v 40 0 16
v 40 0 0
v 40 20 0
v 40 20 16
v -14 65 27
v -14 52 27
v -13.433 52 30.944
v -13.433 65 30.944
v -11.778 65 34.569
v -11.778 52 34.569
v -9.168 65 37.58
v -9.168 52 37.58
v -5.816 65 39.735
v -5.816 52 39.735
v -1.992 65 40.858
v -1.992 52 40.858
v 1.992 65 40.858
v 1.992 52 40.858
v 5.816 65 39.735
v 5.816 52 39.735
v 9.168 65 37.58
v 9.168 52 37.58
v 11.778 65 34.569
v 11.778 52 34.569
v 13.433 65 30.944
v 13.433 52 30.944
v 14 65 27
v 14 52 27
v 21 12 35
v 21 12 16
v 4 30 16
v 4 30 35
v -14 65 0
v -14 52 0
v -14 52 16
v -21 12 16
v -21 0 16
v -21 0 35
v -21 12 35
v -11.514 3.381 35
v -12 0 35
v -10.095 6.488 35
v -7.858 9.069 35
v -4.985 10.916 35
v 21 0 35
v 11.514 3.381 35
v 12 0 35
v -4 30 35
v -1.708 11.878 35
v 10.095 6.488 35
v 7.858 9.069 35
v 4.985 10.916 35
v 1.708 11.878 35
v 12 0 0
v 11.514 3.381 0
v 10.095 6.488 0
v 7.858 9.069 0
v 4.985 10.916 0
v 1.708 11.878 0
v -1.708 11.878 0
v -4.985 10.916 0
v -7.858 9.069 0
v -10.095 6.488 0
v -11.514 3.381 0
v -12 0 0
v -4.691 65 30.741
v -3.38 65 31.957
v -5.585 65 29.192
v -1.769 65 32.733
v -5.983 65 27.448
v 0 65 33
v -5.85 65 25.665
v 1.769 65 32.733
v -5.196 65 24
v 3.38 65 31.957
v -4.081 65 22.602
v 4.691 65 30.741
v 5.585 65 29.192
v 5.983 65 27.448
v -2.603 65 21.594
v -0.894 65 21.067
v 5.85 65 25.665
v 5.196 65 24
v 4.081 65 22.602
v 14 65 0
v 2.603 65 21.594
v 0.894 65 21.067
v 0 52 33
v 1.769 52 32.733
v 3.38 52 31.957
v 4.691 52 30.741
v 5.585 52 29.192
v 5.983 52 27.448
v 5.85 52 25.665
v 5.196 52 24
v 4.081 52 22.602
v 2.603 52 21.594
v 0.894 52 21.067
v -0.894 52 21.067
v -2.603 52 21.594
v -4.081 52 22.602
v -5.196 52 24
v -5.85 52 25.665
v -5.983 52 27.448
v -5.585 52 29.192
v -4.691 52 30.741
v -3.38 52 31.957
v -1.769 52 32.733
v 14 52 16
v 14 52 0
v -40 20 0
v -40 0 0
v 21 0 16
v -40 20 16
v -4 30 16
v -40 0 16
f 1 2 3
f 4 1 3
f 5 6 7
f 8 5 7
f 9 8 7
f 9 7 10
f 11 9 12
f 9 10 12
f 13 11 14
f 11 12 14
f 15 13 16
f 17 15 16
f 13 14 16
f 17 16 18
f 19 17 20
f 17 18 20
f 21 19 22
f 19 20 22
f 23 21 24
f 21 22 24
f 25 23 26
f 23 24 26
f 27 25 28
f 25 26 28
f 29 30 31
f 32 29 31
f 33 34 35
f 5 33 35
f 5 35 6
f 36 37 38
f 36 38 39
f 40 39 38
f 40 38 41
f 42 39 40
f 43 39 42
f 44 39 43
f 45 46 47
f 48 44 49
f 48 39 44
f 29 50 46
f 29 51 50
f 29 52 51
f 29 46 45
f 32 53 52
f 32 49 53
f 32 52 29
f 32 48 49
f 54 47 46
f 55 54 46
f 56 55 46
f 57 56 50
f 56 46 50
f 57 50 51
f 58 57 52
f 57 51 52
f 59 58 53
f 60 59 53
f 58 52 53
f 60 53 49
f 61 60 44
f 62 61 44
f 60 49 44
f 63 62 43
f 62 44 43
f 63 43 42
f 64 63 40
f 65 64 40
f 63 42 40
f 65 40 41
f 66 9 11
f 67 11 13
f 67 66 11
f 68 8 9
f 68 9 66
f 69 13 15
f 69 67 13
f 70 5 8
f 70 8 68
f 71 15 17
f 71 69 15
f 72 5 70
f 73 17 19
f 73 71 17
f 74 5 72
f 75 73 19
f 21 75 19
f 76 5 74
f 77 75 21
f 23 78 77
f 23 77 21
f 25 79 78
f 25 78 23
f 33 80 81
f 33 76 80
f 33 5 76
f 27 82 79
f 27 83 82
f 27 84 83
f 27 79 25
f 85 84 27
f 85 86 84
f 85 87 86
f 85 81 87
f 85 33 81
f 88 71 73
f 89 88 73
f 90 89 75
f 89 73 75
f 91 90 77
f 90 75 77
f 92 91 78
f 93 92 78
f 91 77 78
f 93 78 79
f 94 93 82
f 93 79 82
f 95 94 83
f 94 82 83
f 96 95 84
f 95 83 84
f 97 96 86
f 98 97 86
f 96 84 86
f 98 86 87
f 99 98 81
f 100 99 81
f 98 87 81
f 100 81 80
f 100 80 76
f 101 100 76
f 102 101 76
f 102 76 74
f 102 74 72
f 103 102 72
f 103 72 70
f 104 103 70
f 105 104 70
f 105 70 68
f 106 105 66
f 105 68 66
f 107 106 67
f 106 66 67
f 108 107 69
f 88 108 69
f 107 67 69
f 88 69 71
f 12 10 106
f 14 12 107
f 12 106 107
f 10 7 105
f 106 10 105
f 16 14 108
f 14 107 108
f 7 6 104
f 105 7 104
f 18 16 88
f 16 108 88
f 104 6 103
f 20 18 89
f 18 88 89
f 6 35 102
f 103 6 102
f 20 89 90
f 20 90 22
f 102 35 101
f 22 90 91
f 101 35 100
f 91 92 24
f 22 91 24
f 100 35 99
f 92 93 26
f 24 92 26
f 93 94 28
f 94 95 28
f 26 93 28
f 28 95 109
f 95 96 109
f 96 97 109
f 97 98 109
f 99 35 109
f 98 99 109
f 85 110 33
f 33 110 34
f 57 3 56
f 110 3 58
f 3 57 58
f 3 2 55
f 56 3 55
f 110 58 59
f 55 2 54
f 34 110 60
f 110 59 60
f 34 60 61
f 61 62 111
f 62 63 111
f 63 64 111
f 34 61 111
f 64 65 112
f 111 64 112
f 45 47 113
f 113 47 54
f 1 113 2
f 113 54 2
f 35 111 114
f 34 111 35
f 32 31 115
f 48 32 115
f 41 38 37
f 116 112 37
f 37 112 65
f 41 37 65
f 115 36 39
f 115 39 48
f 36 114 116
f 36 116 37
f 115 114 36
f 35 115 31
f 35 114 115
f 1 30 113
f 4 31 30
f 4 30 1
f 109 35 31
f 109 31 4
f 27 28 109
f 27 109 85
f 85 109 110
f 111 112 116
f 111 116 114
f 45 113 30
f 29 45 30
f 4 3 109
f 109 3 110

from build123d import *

# Parameters (mm, degrees)
EXTRUDE_1_DEPTH     = 16
EXTRUDE_2_DEPTH     = 13
SKETCH_4_R          = 6
CUT_EXTRUDE_1_DEPTH = 13
EXTRUDE_3_DEPTH     = 19
CUT_EXTRUDE_2_DEPTH = 35


with BuildPart() as part:
    # 草图1 → 凸台-拉伸1 (new body)
    with BuildSketch(Plane.XY):
        Polygon((0, 0), (-40, 0), (-40, 20), (-14, 52), (0, 52), align=None)
    extrude_1 = extrude(amount=EXTRUDE_1_DEPTH)

    # 镜向1: 凸台-拉伸1 across plane
    add(extrude_1.mirror(Plane(origin=(0, 0, 16), x_dir=(0, 0, 1), z_dir=(-1, 0, 0))))

    # 草图3 → 凸台-拉伸2 (add)
    with BuildSketch(Plane(origin=(0, 52, 0), x_dir=(1, 0, 0), z_dir=(0, 1, 0))):
        with BuildLine():
            Line((-14, 0), (-14, -27))
            ThreePointArc((-14, -27), (0, -41), (14, -27))
            Line((14, -27), (14, 0))
            Line((14, 0), (-14, 0))
        make_face()
    extrude(amount=EXTRUDE_2_DEPTH)

    # 草图4 → 切除-拉伸1 (cut)
    with BuildSketch(Plane(origin=(0, 65, 0), x_dir=(1, 0, 0), z_dir=(0, 1, 0))):
        with Locations(Location((0, -27, 0), (0, 0, 270))):
            Circle(SKETCH_4_R)
    extrude(amount=-CUT_EXTRUDE_1_DEPTH, mode=Mode.SUBTRACT)

    # 草图5 → 凸台-拉伸3 (add)
    with BuildSketch(Plane.XY.offset(16)):
        Polygon((0, 0), (-21, 0), (-21, 12), (-4, 30), (0, 30), align=None)
    extrude_3 = extrude(amount=EXTRUDE_3_DEPTH)

    # 镜向2: 凸台-拉伸3 across plane
    add(extrude_3.mirror(Plane(origin=(0, 0, 35), x_dir=(0, 0, 1), z_dir=(-1, 0, 0))))

    # 草图6 → 切除-拉伸2 (cut)
    with BuildSketch(Plane.XY.offset(35)):
        with BuildLine():
            Line((-12, 0), (12, 0))
            ThreePointArc((12, 0), (0, 12), (-12, 0))
        make_face()
    extrude(amount=-CUT_EXTRUDE_2_DEPTH, mode=Mode.SUBTRACT)


solid = part.part
